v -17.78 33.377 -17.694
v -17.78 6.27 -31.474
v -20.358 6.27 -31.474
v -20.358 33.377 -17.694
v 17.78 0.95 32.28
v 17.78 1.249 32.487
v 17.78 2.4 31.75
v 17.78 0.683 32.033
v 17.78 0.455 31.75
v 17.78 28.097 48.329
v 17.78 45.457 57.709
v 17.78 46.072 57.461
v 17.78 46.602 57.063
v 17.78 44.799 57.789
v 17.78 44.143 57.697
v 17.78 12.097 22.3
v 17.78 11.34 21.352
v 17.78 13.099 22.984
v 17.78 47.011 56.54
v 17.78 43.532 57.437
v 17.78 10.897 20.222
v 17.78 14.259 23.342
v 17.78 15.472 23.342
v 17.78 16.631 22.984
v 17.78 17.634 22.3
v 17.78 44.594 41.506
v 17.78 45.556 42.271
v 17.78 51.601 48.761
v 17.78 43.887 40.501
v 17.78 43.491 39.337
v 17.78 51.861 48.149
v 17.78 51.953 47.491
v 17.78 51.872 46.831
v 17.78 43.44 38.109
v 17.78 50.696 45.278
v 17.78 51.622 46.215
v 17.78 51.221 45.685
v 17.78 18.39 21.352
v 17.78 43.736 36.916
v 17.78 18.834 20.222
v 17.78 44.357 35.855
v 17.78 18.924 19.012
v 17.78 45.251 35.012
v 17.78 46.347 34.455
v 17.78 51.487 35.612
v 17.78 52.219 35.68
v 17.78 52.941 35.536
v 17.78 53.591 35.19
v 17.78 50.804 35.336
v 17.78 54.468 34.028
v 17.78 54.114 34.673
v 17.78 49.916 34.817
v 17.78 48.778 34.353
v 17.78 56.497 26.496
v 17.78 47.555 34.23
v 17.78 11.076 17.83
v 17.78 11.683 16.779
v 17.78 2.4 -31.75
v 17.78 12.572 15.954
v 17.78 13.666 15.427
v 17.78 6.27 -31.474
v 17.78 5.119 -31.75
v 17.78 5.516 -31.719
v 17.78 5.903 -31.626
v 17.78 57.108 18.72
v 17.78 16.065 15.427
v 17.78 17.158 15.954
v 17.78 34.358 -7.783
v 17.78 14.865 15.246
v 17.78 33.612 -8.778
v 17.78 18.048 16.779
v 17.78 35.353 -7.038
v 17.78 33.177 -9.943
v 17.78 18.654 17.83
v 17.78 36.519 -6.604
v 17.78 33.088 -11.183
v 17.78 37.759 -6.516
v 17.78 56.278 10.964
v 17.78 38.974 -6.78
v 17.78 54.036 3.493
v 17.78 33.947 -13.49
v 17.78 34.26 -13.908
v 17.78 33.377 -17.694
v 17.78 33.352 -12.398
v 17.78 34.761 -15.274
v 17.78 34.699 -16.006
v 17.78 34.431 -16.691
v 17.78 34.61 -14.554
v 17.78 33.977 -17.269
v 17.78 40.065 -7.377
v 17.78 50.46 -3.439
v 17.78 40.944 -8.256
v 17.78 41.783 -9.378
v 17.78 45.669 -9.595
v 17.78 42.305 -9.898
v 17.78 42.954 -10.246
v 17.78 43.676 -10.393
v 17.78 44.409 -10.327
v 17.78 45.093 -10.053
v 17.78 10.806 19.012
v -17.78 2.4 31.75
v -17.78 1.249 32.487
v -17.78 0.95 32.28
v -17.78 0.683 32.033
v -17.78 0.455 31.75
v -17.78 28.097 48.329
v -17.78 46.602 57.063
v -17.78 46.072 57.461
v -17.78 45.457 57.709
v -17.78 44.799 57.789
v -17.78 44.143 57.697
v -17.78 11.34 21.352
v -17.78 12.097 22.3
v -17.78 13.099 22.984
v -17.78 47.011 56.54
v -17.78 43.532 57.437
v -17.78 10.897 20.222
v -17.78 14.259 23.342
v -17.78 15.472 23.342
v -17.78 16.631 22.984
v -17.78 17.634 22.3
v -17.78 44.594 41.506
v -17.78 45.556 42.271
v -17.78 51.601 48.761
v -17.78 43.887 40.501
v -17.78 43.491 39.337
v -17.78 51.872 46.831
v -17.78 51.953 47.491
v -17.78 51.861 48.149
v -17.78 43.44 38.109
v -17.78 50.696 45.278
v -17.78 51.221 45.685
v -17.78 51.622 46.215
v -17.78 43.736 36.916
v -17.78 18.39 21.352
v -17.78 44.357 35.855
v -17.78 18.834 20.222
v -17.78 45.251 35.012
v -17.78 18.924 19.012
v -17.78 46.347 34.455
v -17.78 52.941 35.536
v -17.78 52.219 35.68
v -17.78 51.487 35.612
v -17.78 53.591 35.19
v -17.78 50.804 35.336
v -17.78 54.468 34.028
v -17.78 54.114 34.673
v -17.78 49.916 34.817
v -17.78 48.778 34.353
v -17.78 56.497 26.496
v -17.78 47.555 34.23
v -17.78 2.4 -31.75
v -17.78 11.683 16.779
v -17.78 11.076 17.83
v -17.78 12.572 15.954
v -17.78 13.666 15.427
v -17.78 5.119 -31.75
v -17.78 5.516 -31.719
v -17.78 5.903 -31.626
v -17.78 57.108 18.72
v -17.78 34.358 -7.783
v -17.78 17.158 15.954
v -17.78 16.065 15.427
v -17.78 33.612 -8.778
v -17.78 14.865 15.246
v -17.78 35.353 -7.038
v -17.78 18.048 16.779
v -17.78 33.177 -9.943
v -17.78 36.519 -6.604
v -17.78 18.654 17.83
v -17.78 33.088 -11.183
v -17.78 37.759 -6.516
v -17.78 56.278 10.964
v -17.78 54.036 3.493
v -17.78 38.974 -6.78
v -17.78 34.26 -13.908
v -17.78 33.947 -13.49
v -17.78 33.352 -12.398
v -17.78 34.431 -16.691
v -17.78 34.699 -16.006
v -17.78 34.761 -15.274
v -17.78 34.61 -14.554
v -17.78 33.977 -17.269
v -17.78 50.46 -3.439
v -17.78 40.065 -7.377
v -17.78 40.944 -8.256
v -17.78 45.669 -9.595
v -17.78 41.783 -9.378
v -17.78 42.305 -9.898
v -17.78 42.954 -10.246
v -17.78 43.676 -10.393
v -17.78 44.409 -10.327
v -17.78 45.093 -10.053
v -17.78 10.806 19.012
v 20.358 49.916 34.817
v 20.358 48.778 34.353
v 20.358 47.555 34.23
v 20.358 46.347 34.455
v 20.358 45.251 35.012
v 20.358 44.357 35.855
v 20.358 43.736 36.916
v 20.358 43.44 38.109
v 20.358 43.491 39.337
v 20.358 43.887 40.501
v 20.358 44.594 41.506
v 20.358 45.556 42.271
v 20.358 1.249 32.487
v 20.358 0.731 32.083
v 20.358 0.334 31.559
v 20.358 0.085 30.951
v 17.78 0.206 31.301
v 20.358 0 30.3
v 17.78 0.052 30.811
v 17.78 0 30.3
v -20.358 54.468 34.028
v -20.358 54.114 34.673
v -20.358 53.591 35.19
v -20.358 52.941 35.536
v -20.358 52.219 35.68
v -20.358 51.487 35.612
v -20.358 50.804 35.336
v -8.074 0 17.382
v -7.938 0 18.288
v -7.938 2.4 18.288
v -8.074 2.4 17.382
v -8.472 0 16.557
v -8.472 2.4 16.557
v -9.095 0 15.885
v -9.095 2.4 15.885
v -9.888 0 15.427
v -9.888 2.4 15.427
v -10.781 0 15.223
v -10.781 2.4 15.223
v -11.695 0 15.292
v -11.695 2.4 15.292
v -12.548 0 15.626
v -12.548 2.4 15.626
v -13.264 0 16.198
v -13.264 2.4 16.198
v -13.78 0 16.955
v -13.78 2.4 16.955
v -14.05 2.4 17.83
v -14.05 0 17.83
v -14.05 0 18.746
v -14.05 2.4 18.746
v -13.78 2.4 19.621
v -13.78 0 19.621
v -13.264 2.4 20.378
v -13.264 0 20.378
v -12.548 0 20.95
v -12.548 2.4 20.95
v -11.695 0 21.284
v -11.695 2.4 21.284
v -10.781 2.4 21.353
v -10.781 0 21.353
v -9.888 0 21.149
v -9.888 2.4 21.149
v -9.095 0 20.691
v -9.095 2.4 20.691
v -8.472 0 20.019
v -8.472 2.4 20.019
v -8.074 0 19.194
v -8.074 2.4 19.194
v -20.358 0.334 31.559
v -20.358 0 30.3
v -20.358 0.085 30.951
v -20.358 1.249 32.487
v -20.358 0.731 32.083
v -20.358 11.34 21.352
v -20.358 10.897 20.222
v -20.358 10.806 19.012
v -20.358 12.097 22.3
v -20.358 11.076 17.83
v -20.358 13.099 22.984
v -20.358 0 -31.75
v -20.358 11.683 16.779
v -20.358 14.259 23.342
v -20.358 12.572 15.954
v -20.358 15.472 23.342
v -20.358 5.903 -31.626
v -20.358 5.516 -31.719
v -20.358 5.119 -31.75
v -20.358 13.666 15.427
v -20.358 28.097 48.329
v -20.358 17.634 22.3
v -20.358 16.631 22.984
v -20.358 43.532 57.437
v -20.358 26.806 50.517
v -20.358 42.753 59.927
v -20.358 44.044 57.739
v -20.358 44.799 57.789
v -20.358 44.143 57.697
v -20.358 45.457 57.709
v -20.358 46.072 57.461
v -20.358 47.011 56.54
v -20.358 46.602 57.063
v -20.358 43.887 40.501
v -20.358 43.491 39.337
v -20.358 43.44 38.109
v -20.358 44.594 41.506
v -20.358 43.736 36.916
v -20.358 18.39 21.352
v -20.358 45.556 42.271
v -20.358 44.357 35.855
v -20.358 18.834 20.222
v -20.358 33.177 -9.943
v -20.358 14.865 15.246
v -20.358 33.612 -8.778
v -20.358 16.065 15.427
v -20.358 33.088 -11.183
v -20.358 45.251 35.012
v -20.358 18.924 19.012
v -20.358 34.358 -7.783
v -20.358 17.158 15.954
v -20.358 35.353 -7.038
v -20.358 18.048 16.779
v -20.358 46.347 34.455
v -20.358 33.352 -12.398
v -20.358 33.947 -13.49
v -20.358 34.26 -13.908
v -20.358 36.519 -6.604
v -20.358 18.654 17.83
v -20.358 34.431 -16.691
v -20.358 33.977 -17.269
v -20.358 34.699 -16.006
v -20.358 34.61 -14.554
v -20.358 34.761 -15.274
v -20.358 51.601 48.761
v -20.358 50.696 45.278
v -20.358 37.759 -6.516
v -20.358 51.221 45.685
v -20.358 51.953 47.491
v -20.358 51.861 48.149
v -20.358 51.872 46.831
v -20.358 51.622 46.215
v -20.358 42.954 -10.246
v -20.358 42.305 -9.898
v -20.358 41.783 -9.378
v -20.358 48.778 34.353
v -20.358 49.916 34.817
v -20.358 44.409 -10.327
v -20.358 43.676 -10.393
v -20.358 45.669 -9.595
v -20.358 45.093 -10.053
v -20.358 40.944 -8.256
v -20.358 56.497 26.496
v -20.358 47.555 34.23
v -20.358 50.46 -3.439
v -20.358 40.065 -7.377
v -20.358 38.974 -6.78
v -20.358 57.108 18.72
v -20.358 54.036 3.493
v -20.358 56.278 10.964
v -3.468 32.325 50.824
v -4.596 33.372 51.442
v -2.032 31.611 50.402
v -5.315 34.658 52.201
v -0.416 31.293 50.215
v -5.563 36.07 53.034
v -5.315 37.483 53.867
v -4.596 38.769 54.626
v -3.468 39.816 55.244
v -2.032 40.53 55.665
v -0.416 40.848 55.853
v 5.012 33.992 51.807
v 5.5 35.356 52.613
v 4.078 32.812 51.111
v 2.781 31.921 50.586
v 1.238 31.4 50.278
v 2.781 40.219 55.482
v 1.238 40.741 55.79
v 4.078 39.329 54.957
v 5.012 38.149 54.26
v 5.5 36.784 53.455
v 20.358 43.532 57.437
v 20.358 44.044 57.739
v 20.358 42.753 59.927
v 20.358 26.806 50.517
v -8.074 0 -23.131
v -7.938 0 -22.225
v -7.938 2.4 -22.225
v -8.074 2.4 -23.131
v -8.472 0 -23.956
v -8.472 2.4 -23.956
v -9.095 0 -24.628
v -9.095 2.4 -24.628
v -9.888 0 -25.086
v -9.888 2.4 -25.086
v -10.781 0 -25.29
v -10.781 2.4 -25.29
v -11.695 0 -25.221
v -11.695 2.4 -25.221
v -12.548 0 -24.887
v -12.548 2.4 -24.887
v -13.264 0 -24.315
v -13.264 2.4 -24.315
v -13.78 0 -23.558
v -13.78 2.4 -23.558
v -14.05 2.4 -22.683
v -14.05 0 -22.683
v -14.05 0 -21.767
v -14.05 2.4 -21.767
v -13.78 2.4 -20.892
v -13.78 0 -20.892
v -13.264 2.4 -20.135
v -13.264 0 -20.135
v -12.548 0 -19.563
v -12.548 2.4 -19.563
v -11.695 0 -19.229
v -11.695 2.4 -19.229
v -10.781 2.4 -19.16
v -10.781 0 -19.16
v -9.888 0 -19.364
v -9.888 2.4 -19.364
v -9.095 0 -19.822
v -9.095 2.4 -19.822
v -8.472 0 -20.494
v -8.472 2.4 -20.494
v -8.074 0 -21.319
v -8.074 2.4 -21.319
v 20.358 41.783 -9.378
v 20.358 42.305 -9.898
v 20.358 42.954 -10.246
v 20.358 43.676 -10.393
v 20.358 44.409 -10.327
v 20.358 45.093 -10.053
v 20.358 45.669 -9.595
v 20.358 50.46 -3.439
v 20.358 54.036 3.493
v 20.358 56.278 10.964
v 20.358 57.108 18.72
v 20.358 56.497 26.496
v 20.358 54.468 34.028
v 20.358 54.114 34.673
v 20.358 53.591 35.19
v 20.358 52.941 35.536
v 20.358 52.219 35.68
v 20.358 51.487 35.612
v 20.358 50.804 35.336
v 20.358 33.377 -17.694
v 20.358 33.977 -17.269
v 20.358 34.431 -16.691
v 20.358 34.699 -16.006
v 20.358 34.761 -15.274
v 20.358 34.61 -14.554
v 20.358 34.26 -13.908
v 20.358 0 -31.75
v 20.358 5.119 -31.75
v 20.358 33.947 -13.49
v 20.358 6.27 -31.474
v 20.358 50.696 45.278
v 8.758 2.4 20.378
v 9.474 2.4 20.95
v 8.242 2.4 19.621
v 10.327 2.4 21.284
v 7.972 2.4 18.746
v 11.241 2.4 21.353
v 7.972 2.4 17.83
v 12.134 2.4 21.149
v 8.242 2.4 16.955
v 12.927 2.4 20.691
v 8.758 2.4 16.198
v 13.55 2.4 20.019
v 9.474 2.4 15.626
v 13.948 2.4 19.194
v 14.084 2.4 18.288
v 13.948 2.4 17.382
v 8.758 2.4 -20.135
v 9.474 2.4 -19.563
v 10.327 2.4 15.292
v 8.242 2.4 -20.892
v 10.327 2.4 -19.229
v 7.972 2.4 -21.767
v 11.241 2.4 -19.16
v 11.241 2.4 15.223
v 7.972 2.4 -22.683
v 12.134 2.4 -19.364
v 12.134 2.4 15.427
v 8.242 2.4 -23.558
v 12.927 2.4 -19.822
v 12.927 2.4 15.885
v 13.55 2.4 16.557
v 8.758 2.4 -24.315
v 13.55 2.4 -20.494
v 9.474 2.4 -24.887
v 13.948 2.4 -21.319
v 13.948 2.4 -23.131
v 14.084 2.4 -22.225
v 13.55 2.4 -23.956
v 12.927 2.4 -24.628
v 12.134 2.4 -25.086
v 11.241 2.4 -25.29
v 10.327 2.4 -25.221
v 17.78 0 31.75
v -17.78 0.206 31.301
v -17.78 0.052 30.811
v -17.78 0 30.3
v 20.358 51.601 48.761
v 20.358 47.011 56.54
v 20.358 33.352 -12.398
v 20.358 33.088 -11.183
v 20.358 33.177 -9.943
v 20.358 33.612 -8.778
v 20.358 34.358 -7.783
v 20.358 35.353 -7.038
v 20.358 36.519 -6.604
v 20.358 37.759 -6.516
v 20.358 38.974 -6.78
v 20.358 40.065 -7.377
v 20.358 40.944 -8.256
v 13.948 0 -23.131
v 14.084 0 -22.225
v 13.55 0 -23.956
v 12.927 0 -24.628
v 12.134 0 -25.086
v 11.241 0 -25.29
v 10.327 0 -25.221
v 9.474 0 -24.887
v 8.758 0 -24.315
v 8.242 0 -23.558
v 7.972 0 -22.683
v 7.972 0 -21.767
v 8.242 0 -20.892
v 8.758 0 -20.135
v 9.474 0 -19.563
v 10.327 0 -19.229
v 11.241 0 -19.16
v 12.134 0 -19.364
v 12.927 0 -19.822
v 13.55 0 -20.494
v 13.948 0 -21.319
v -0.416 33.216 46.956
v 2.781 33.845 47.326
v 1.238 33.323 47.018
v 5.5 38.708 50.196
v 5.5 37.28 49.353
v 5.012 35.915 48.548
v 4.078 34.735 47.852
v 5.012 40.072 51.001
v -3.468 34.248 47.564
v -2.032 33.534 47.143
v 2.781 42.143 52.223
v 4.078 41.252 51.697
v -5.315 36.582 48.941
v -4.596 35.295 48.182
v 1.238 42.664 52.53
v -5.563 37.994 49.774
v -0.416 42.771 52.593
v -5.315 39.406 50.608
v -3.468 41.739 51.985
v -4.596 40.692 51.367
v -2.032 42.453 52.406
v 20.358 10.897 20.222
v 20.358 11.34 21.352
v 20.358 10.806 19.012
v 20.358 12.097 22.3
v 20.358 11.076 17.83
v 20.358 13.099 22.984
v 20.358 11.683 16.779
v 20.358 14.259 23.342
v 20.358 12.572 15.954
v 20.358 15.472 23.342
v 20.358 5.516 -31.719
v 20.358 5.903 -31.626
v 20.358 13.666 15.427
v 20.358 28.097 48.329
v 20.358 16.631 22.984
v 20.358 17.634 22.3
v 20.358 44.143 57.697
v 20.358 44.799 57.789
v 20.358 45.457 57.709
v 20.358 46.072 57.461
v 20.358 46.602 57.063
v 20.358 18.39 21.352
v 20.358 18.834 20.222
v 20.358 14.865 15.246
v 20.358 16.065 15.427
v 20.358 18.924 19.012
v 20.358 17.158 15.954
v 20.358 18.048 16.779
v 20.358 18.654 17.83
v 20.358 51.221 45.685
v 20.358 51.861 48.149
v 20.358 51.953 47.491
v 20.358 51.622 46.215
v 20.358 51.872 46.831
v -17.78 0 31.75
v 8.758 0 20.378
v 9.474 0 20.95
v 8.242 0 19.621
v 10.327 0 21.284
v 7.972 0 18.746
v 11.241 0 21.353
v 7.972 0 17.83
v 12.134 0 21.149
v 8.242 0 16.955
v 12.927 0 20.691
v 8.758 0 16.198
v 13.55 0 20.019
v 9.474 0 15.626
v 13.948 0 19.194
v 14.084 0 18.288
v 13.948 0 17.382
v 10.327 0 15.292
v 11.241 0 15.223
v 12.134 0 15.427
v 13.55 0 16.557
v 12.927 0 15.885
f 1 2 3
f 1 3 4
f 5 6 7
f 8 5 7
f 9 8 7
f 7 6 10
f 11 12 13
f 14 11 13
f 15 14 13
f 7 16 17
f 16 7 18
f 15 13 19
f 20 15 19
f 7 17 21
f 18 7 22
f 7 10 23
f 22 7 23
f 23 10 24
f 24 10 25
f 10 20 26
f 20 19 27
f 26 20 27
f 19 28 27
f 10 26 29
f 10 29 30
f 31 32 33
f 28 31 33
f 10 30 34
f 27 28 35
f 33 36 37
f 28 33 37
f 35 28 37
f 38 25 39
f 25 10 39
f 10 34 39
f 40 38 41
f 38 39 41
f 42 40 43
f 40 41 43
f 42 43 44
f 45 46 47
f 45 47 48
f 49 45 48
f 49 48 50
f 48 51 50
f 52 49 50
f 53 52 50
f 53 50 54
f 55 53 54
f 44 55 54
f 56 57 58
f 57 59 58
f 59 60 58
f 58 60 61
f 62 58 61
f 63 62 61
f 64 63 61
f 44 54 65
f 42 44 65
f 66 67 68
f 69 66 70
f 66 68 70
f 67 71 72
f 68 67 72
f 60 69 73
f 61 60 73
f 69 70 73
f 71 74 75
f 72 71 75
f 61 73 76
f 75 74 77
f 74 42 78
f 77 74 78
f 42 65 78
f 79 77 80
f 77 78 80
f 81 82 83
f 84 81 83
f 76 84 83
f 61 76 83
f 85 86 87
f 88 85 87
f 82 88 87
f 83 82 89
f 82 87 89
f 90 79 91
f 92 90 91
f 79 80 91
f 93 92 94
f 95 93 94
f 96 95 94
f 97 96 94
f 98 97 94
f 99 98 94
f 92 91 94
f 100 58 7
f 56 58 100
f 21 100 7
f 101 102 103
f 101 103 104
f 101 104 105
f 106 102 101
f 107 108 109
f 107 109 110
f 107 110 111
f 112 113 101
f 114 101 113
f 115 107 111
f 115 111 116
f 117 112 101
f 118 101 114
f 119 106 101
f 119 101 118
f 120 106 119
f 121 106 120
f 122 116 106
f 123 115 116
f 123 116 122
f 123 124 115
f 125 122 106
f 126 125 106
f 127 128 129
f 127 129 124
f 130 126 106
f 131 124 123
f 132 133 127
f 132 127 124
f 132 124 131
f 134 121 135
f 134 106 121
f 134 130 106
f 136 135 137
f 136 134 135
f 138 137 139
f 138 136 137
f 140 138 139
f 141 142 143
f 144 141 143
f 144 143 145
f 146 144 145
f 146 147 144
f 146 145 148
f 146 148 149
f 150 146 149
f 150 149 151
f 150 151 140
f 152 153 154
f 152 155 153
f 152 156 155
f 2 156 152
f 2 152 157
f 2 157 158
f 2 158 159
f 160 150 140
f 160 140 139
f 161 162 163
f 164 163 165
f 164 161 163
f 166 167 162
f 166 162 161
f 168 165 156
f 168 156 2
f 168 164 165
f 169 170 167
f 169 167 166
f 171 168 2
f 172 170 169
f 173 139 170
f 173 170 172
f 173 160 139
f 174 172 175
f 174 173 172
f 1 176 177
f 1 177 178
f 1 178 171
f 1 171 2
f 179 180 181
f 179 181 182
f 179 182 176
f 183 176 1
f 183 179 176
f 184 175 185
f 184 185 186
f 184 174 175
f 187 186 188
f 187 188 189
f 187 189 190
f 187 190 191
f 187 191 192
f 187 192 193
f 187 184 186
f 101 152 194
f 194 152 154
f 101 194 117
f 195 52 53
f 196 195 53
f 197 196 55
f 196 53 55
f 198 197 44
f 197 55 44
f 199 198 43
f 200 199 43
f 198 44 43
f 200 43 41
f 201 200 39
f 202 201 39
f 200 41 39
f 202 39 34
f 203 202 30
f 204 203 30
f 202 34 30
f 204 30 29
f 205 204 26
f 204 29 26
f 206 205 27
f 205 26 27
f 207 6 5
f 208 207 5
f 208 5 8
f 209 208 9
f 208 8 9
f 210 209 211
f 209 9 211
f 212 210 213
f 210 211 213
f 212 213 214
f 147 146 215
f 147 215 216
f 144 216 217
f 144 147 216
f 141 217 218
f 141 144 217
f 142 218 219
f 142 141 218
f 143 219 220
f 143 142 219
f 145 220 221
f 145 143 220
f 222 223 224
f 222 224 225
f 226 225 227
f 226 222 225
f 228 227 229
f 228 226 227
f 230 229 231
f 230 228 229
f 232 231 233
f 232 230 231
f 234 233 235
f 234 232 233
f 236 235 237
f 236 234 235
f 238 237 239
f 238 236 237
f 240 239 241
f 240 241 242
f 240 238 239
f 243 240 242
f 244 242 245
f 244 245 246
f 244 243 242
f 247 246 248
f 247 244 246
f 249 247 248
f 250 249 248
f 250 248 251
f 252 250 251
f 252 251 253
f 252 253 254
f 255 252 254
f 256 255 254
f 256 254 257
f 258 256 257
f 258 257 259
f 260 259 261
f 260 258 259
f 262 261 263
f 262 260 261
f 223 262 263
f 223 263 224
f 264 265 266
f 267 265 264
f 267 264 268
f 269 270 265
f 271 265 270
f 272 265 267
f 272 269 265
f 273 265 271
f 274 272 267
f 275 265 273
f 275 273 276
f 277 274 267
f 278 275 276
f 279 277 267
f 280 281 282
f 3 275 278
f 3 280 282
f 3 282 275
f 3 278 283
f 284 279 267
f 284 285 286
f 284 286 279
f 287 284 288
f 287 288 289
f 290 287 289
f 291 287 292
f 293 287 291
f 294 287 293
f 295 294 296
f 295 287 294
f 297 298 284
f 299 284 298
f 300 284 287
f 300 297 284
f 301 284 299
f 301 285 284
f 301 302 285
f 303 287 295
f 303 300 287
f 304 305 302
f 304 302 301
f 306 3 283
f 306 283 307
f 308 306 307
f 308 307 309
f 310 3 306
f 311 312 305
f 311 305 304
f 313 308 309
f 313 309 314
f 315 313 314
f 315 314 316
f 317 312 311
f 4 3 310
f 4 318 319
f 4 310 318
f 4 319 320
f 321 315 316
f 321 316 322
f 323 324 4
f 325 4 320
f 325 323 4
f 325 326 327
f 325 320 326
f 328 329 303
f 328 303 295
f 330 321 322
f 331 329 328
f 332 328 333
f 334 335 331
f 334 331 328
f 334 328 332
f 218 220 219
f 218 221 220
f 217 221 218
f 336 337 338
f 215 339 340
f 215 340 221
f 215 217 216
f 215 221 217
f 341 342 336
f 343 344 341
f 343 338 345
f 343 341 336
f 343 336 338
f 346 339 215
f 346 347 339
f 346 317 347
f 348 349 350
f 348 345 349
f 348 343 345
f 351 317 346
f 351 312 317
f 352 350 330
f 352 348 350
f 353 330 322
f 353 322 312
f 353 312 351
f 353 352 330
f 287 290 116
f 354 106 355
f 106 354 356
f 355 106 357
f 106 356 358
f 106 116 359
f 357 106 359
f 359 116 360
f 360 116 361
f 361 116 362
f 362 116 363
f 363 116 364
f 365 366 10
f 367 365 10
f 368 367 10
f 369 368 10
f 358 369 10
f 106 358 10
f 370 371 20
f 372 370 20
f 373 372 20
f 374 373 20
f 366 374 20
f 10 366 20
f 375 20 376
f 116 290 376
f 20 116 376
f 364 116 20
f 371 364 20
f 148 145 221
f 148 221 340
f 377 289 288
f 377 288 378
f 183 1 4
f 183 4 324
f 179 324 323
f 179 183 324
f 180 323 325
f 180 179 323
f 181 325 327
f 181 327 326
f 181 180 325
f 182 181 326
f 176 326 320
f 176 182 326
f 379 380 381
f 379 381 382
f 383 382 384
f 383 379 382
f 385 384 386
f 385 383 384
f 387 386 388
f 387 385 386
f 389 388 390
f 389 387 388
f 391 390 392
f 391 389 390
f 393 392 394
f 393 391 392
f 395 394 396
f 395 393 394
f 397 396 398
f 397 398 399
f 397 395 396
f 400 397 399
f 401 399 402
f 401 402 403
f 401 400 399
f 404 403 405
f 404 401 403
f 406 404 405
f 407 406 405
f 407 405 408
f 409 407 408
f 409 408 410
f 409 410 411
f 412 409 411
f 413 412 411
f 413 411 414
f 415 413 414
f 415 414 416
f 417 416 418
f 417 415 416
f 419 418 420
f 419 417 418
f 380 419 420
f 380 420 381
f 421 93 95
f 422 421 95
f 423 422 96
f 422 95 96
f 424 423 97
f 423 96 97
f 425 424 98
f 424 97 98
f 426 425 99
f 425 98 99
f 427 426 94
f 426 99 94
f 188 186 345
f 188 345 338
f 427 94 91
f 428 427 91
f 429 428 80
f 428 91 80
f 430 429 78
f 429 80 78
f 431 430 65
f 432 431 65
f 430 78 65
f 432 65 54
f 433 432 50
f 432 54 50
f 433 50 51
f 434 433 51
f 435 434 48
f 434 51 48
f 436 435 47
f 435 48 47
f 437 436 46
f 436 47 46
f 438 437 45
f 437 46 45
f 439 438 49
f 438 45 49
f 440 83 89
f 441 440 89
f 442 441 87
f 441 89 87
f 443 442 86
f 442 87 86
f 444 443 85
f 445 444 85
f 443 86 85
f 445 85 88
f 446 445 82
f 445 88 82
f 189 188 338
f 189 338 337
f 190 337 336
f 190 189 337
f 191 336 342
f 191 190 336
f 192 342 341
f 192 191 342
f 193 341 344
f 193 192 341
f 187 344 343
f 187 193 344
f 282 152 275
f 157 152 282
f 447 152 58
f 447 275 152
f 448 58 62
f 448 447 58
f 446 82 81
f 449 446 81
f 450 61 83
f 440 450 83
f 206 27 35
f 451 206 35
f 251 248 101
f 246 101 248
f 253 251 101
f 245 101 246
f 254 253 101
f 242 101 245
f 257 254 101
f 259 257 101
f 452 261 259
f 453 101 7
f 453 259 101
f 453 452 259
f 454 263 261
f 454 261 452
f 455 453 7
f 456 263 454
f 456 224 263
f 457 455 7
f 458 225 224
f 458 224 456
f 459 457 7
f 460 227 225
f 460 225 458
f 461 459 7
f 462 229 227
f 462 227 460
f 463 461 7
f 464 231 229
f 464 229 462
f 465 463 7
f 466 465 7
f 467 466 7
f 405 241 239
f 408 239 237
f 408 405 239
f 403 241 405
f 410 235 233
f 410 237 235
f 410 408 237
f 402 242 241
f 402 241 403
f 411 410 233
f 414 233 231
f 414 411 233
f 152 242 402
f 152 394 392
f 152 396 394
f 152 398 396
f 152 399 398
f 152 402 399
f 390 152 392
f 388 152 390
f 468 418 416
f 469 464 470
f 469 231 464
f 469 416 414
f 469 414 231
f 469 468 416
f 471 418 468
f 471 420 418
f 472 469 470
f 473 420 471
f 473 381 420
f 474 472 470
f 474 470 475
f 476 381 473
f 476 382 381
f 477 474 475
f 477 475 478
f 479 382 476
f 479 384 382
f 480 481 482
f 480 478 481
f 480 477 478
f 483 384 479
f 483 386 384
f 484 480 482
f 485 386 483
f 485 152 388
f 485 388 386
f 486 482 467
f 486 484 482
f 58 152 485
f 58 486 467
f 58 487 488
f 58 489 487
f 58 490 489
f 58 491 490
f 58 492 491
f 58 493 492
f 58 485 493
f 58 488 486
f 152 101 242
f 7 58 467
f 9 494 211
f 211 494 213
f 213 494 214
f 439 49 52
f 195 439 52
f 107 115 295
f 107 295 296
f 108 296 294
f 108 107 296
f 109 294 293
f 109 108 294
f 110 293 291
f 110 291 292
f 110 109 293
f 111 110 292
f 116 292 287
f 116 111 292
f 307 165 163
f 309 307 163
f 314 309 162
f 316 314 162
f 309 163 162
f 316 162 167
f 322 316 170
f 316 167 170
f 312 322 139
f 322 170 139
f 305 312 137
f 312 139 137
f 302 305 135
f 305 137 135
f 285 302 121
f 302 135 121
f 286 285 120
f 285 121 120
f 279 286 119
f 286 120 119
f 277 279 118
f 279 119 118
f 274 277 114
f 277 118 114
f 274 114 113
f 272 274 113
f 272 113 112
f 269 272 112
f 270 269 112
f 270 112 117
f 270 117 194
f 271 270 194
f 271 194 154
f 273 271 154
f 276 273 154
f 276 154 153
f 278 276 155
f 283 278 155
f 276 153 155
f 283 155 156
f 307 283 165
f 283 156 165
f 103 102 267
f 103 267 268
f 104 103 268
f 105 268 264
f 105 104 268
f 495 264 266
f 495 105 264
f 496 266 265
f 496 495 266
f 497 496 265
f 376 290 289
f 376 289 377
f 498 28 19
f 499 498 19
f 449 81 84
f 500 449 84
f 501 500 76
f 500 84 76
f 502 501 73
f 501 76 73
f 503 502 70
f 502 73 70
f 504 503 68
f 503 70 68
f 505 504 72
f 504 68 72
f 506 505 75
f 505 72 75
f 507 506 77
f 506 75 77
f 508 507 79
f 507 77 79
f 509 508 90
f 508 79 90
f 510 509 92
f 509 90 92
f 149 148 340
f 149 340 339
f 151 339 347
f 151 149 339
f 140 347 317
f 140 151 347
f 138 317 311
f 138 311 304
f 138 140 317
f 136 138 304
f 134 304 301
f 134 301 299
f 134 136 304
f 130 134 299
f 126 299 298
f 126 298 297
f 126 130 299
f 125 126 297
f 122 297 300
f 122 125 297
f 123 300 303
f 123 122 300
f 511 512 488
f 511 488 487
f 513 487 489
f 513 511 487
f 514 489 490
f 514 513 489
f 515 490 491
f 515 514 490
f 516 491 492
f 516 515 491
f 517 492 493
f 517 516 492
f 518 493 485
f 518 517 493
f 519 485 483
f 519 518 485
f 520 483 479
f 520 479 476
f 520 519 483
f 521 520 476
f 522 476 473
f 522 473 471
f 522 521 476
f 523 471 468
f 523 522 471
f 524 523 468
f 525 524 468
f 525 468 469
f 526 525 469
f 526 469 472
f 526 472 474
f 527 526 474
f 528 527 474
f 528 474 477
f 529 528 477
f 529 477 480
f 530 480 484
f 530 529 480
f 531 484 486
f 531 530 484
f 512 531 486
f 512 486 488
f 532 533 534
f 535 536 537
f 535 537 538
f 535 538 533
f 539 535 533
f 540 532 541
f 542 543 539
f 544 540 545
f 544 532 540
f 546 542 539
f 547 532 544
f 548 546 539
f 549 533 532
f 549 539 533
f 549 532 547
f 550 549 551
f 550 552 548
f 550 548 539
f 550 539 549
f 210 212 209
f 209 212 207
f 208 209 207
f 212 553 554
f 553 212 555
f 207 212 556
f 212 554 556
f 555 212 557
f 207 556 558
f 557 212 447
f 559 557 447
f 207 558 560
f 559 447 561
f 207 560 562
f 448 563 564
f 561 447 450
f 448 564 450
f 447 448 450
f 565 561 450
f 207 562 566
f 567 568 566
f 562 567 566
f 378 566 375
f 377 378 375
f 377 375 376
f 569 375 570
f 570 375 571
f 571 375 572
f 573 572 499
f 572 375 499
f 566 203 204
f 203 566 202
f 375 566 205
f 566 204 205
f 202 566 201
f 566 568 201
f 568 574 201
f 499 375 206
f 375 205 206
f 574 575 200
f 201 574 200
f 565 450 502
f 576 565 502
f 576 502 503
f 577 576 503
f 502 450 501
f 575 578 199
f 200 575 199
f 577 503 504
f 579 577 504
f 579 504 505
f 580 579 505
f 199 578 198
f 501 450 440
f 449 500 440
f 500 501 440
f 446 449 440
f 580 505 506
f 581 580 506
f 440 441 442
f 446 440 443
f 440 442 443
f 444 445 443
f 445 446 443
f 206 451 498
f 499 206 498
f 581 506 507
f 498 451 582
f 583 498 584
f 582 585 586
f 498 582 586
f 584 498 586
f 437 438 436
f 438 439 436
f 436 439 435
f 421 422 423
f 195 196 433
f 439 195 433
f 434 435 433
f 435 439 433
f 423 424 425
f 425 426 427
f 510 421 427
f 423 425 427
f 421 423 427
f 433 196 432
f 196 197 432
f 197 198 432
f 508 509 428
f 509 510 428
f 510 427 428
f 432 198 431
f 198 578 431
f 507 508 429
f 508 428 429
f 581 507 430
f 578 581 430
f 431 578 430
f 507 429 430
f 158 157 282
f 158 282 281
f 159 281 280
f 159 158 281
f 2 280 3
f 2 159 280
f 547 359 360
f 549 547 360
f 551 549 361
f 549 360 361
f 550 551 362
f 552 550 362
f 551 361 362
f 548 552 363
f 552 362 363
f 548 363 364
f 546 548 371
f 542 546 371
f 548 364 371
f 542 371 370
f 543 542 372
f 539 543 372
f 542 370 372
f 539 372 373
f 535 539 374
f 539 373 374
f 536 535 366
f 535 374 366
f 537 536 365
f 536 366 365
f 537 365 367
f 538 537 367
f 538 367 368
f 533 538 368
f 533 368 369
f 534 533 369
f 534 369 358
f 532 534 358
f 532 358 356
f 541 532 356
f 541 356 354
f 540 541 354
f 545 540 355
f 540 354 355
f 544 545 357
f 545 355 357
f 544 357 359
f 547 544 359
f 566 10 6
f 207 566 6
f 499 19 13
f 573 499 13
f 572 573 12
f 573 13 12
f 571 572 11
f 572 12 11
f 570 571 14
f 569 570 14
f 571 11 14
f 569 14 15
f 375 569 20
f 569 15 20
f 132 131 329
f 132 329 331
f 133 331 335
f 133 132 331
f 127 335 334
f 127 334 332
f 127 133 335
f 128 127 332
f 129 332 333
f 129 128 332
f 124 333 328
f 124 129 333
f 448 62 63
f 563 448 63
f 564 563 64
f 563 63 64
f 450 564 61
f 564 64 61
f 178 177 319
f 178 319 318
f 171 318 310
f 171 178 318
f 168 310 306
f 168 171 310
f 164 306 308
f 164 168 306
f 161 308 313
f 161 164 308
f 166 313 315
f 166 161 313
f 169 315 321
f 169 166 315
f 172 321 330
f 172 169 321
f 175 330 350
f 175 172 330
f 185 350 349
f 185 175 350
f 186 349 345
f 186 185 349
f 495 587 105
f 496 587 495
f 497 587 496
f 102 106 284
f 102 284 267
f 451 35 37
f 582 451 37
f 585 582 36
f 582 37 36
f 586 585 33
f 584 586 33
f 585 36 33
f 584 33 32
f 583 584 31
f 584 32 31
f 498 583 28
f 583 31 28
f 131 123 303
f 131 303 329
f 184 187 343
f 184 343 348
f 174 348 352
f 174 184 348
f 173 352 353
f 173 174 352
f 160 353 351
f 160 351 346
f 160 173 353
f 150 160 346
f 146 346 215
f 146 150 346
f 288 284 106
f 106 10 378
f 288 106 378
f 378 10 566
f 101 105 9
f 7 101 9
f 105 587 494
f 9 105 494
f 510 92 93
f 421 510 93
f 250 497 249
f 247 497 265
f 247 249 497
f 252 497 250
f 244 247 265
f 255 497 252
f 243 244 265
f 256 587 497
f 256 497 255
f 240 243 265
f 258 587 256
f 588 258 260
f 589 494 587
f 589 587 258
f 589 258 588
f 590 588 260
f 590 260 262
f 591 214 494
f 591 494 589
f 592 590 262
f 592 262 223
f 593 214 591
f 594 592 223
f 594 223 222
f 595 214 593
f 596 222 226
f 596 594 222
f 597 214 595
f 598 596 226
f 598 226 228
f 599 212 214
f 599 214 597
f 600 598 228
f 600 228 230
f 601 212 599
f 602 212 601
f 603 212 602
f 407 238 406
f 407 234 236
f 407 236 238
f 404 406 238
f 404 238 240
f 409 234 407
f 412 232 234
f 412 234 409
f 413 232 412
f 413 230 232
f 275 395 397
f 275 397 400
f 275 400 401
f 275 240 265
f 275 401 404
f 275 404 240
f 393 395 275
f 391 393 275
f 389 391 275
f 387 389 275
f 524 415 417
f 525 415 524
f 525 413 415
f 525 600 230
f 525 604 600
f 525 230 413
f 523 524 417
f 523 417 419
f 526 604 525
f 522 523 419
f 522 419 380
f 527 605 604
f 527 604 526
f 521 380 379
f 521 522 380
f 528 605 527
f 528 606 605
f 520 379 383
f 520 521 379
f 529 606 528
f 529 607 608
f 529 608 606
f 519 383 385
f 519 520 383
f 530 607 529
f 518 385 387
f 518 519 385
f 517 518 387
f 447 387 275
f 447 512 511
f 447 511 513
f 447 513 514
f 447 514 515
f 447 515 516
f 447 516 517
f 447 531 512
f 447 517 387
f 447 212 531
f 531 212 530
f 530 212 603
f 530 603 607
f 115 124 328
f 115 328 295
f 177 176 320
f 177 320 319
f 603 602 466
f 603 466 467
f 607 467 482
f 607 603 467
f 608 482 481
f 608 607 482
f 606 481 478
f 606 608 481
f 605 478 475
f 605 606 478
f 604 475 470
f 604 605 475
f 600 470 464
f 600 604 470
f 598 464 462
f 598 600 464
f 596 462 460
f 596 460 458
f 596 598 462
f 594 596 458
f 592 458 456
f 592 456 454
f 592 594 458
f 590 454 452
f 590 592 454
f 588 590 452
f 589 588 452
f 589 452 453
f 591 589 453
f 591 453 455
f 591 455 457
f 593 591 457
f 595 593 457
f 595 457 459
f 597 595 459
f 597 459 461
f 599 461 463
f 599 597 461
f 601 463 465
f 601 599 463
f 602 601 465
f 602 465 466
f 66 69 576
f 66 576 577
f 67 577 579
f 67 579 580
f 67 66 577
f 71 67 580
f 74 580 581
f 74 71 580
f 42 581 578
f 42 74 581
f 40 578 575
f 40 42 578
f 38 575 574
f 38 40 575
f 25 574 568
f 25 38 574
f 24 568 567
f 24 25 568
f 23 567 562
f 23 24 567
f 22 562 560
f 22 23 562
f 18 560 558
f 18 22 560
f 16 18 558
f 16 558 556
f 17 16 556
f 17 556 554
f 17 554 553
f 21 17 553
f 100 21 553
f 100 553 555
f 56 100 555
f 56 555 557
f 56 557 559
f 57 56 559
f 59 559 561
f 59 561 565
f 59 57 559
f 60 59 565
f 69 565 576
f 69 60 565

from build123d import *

# Parameters (mm, degrees)
SKETCH1_W           = 35.56
SKETCH1_H           = 63.5
SKETCH1_R           = 3.0734
BOSS_EXTRUDE1_DEPTH = 2.4003
SKETCH2_R           = 4.07035
BOSS_EXTRUDE2_DEPTH = 2.5781
SKETCH3_W           = 40.7162
SKETCH3_H           = 18.5166
BOSS_EXTRUDE3_DEPTH = 2.54
SKETCH4_R           = 5.5626
BOSS_EXTRUDE4_DEPTH = 3.7846


with BuildPart() as part:
    # Sketch1 → Boss-Extrude1 (new body)
    with BuildSketch(Plane(origin=(0, 0, 0), x_dir=(1, 0, 0), z_dir=(0, 1, 0))):
        Rectangle(SKETCH1_W, SKETCH1_H)
        with Locations((-11.0109, 22.225)):
            Circle(SKETCH1_R, mode=Mode.SUBTRACT)
        with Locations((-11.0109, -18.288)):
            Circle(SKETCH1_R, mode=Mode.SUBTRACT)
        with Locations((11.0109, -18.288)):
            Circle(SKETCH1_R, mode=Mode.SUBTRACT)
        with Locations((11.0109, 22.225)):
            Circle(SKETCH1_R, mode=Mode.SUBTRACT)
    extrude(amount=BOSS_EXTRUDE1_DEPTH)

    # Sketch2 → Boss-Extrude2 (add)
    with BuildSketch(Plane(origin=(17.78, 0, 0), x_dir=(0, 0, -1), z_dir=(1, 0, 0))):
        with BuildLine():
            Line((31.75, 0), (31.75, 5.119118053))
            ThreePointArc((31.75, 5.119118053), (31.680088236, 5.710949198), (31.474201493, 6.270200848))
            Line((31.474201493, 6.270200848), (17.693567666, 33.376966591))
            ThreePointArc((17.693567666, 33.376966591), (16.006303844, 34.699493087), (13.908046107, 34.259890987))
            Line((13.908046107, 34.259890987), (13.489778208, 33.947050723))
            ThreePointArc((13.489778208, 33.947050723), (7.374615324, 34.828872577), (8.256437178, 40.944035461))
            Line((8.256437178, 40.944035461), (9.378285973, 41.783113656))
            ThreePointArc((9.378285973, 41.783113656), (10.39301658, 43.675533493), (9.59524257, 45.66914521))
            ThreePointArc((9.59524257, 45.66914521), (-10.963994808, 56.277959645), (-34.028081087, 54.467680828))
            ThreePointArc((-34.028081087, 54.467680828), (-35.535691357, 52.940715566), (-35.336051172, 50.80421014))
            Line((-35.336051172, 50.80421014), (-34.816573654, 49.916114029))
            ThreePointArc((-34.816573654, 49.916114029), (-36.36360729, 44.008751256), (-42.270970063, 45.555784893))
            Line((-42.270970063, 45.555784893), (-45.277675805, 50.696033664))
            ThreePointArc((-45.277675805, 50.696033664), (-46.831353511, 51.871946179), (-48.760952094, 51.601143727))
            Line((-48.760952094, 51.601143727), (-56.540301411, 47.010806757))
            ThreePointArc((-56.540301411, 47.010806757), (-57.70907124, 45.457347112), (-57.437054463, 43.532440191))
            Line((-57.437054463, 43.532440191), (-32.487107654, 1.249193243))
            ThreePointArc((-32.487107654, 1.249193243), (-31.559101504, 0.334297259), (-30.299547846, 0))
            Line((-30.299547846, 0), (31.75, 0))
        make_face()
        with Locations((-19.316644044, 14.86535)):
            Circle(SKETCH2_R, mode=Mode.SUBTRACT)
    boss_extrude2 = extrude(amount=BOSS_EXTRUDE2_DEPTH)

    # Mirror1: Boss-Extrude2 across plane
    add(boss_extrude2.mirror(Plane.ZY))

    # Sketch3 → Boss-Extrude3 (add)
    with BuildSketch(Plane(origin=(0, -13.896244991, 23.550285021), x_dir=(1, 0, 0), z_dir=(0, -0.508191637, 0.861244019))):
        with Locations((0, 58.016828481)):
            Rectangle(SKETCH3_W, SKETCH3_H)
    extrude(amount=BOSS_EXTRUDE3_DEPTH)

    # Sketch4 → Boss-Extrude4 (add)
    with BuildSketch(Plane(origin=(0, -13.896244991, 23.550285021), x_dir=(-1, 0, 0), z_dir=(0, 0.508191637, -0.861244019))):
        with Locations((0, 58.016828481)):
            Circle(SKETCH4_R)
    extrude(amount=BOSS_EXTRUDE4_DEPTH)


solid = part.part
